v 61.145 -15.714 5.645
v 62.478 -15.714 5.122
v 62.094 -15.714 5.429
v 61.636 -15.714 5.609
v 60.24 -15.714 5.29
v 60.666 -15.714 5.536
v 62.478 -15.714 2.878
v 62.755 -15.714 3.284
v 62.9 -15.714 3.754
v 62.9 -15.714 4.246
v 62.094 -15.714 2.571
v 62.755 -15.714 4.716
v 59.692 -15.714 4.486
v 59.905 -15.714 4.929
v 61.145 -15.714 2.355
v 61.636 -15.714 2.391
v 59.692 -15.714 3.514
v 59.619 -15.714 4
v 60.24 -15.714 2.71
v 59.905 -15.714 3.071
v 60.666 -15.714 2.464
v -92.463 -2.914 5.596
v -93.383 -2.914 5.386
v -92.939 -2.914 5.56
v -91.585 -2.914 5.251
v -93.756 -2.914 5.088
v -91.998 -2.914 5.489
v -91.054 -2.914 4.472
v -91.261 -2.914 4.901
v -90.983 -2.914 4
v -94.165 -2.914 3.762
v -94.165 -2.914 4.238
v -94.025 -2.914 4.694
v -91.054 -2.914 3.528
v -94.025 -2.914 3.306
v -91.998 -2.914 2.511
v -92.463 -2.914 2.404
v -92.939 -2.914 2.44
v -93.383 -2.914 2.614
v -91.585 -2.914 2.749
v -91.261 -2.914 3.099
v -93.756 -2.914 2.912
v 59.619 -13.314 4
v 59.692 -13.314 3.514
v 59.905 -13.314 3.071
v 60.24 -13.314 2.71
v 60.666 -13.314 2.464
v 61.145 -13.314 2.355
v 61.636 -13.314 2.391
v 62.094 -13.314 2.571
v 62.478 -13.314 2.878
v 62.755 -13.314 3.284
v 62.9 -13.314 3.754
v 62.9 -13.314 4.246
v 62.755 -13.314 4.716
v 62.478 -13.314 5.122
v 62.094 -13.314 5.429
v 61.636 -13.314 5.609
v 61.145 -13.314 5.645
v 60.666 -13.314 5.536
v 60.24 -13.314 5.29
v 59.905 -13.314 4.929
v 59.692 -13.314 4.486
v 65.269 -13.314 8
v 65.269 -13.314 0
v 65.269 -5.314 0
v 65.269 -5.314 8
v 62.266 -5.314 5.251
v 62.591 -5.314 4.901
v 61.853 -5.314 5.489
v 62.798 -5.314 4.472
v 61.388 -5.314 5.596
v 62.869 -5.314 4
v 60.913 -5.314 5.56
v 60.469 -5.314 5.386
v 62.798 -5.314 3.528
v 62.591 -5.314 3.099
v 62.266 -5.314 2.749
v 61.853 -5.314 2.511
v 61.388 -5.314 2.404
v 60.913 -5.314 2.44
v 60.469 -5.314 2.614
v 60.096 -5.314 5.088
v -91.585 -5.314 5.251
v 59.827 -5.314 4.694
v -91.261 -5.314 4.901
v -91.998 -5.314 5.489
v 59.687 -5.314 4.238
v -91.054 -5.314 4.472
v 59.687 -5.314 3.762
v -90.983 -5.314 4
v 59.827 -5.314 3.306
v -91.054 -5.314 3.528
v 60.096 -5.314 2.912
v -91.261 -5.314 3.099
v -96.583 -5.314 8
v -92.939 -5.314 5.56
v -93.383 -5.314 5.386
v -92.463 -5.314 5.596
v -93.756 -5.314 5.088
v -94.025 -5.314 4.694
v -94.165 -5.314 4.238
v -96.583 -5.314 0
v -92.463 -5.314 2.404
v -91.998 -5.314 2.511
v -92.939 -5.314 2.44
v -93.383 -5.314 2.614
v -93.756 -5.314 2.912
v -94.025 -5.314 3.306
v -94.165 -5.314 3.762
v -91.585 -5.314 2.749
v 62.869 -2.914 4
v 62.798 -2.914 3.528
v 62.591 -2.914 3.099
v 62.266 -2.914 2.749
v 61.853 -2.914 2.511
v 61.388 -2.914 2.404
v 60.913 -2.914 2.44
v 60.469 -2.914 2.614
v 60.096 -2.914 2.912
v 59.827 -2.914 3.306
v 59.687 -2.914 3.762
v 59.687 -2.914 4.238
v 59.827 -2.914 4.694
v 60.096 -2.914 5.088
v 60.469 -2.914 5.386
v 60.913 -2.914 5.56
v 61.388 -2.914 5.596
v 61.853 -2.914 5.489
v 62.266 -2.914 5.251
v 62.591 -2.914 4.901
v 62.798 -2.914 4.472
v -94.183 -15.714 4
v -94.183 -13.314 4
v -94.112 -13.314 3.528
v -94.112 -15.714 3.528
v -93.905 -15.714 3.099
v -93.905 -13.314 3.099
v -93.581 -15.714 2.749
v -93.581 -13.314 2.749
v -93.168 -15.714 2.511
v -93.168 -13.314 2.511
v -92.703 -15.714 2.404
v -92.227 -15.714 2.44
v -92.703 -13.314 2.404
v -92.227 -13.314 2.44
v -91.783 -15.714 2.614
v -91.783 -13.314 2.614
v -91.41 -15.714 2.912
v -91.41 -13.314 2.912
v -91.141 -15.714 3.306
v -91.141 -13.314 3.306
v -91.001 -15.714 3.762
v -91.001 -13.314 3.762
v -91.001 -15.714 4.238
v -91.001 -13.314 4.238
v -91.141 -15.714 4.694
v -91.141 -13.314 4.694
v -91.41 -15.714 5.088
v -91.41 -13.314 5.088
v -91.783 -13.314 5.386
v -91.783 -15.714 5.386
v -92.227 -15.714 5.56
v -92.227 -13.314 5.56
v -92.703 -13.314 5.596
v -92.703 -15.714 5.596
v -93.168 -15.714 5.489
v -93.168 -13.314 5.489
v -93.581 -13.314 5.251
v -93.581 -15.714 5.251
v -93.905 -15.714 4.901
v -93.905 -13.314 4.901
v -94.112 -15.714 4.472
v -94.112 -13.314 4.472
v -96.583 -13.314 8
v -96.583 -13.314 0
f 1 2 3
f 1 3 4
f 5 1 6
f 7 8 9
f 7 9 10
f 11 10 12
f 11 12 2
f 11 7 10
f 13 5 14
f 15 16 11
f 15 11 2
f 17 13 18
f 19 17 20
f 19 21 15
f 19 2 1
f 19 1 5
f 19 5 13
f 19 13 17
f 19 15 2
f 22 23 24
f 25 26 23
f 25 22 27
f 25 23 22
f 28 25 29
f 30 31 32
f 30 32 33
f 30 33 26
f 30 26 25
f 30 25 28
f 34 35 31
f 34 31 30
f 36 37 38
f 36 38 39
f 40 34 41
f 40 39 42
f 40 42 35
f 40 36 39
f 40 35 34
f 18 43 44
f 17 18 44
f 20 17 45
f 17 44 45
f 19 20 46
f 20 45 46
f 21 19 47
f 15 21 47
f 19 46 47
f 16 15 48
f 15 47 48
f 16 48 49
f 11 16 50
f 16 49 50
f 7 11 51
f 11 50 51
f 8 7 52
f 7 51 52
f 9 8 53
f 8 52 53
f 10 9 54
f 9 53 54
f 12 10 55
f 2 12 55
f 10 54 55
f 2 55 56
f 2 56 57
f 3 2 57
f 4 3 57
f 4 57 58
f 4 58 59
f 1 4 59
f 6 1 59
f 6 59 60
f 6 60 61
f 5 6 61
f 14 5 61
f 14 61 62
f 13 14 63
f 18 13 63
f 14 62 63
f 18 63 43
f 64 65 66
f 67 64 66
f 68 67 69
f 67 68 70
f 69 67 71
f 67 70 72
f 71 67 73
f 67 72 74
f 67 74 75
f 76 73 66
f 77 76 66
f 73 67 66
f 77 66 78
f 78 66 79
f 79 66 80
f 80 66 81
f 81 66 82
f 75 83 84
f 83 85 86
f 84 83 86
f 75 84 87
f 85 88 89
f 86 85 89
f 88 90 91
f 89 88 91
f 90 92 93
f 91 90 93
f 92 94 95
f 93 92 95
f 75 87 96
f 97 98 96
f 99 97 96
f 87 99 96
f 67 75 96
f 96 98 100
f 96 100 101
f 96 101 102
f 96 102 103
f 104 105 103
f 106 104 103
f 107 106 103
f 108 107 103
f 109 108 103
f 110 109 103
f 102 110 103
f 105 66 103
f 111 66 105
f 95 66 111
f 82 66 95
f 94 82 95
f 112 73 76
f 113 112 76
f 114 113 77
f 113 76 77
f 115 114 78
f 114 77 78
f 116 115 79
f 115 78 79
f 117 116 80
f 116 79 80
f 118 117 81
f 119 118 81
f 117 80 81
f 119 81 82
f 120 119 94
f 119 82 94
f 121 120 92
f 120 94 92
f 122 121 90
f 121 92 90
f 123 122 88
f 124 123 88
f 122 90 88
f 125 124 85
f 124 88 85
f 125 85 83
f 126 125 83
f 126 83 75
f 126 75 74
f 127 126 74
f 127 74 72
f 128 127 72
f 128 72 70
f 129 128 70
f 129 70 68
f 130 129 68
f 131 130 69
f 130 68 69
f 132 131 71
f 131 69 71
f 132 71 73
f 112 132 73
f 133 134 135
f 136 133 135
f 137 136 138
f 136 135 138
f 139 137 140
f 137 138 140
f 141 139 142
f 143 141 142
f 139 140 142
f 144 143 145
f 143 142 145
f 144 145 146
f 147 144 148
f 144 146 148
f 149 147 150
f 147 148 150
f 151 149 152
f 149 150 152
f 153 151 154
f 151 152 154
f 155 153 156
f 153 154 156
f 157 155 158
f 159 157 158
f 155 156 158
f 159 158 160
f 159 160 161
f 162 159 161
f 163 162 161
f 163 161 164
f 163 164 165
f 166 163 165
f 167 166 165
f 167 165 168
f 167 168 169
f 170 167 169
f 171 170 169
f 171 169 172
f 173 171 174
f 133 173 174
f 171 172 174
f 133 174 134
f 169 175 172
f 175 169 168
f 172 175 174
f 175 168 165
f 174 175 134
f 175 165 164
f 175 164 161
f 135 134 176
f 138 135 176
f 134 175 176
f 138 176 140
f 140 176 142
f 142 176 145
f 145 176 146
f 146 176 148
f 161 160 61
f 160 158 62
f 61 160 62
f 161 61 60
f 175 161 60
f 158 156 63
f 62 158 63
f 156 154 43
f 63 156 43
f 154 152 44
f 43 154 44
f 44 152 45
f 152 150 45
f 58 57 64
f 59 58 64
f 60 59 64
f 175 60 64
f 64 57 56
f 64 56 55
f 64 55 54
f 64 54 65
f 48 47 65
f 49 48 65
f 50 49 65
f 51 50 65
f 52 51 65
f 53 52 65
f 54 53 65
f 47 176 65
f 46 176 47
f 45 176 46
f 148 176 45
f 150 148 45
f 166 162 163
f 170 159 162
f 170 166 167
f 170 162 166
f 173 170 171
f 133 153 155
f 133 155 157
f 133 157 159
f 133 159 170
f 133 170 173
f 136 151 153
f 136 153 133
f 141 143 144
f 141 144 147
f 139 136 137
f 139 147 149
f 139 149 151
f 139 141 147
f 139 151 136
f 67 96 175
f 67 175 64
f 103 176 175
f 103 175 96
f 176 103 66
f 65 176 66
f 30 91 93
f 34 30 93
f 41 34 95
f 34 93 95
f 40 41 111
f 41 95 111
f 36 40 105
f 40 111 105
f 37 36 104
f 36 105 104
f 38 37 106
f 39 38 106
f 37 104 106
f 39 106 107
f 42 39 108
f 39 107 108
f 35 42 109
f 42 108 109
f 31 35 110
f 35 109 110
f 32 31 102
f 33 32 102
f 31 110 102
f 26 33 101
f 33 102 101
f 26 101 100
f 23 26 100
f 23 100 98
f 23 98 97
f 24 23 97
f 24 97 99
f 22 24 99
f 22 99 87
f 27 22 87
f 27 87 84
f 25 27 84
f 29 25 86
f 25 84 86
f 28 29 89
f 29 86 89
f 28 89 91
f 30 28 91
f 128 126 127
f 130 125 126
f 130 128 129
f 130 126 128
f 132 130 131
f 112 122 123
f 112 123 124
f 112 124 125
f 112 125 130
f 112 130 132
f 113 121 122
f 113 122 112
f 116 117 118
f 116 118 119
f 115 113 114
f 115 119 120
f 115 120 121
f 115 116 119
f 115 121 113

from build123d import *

# Parameters (mm, degrees)
SKETCH_1_W      = 4
SKETCH_1_H      = 8
SKETCH_1_W_2    = 153.851648
EXTRUDE_1_DEPTH = 8
SKETCH_2_R      = 1.6
EXTRUDE_2_DEPTH = 2.4
SKETCH_3_R      = 1.6
SKETCH_3_R_2    = 1.65
EXTRUDE_3_DEPTH = 2.4


with BuildPart() as part:
    # 草图1 → 凸台-拉伸1 (new body)
    with BuildSketch(Plane.XY):
        with Locations((-94.582983627, -9.313586075)):
            Rectangle(SKETCH_1_W, SKETCH_1_H)
        with Locations((-15.657159627, -9.313586075)):
            Rectangle(SKETCH_1_W_2, SKETCH_1_H)
        with Locations((63.268664373, -9.313586075)):
            Rectangle(SKETCH_1_W, SKETCH_1_H)
    extrude(amount=EXTRUDE_1_DEPTH)

    # 草图2 → 凸台-拉伸2 (add)
    with BuildSketch(Plane(origin=(0, -5.313586075, 0), x_dir=(1, 0, 0), z_dir=(0, 1, 0))):
        with Locations((-92.582983627, -4)):
            Circle(SKETCH_2_R)
        with Locations((61.268664373, -4)):
            Circle(SKETCH_2_R)
    extrude(amount=EXTRUDE_2_DEPTH)

    # 草图3 → 凸台-拉伸3 (add)
    with BuildSketch(Plane(origin=(0, -13.313586075, 0), x_dir=(-1, 0, 0), z_dir=(0, -1, 0))):
        with Locations((92.582983627, -4)):
            Circle(SKETCH_3_R)
        with Locations((-61.268664373, -4)):
            Circle(SKETCH_3_R_2)
    extrude(amount=EXTRUDE_3_DEPTH)


solid = part.part
